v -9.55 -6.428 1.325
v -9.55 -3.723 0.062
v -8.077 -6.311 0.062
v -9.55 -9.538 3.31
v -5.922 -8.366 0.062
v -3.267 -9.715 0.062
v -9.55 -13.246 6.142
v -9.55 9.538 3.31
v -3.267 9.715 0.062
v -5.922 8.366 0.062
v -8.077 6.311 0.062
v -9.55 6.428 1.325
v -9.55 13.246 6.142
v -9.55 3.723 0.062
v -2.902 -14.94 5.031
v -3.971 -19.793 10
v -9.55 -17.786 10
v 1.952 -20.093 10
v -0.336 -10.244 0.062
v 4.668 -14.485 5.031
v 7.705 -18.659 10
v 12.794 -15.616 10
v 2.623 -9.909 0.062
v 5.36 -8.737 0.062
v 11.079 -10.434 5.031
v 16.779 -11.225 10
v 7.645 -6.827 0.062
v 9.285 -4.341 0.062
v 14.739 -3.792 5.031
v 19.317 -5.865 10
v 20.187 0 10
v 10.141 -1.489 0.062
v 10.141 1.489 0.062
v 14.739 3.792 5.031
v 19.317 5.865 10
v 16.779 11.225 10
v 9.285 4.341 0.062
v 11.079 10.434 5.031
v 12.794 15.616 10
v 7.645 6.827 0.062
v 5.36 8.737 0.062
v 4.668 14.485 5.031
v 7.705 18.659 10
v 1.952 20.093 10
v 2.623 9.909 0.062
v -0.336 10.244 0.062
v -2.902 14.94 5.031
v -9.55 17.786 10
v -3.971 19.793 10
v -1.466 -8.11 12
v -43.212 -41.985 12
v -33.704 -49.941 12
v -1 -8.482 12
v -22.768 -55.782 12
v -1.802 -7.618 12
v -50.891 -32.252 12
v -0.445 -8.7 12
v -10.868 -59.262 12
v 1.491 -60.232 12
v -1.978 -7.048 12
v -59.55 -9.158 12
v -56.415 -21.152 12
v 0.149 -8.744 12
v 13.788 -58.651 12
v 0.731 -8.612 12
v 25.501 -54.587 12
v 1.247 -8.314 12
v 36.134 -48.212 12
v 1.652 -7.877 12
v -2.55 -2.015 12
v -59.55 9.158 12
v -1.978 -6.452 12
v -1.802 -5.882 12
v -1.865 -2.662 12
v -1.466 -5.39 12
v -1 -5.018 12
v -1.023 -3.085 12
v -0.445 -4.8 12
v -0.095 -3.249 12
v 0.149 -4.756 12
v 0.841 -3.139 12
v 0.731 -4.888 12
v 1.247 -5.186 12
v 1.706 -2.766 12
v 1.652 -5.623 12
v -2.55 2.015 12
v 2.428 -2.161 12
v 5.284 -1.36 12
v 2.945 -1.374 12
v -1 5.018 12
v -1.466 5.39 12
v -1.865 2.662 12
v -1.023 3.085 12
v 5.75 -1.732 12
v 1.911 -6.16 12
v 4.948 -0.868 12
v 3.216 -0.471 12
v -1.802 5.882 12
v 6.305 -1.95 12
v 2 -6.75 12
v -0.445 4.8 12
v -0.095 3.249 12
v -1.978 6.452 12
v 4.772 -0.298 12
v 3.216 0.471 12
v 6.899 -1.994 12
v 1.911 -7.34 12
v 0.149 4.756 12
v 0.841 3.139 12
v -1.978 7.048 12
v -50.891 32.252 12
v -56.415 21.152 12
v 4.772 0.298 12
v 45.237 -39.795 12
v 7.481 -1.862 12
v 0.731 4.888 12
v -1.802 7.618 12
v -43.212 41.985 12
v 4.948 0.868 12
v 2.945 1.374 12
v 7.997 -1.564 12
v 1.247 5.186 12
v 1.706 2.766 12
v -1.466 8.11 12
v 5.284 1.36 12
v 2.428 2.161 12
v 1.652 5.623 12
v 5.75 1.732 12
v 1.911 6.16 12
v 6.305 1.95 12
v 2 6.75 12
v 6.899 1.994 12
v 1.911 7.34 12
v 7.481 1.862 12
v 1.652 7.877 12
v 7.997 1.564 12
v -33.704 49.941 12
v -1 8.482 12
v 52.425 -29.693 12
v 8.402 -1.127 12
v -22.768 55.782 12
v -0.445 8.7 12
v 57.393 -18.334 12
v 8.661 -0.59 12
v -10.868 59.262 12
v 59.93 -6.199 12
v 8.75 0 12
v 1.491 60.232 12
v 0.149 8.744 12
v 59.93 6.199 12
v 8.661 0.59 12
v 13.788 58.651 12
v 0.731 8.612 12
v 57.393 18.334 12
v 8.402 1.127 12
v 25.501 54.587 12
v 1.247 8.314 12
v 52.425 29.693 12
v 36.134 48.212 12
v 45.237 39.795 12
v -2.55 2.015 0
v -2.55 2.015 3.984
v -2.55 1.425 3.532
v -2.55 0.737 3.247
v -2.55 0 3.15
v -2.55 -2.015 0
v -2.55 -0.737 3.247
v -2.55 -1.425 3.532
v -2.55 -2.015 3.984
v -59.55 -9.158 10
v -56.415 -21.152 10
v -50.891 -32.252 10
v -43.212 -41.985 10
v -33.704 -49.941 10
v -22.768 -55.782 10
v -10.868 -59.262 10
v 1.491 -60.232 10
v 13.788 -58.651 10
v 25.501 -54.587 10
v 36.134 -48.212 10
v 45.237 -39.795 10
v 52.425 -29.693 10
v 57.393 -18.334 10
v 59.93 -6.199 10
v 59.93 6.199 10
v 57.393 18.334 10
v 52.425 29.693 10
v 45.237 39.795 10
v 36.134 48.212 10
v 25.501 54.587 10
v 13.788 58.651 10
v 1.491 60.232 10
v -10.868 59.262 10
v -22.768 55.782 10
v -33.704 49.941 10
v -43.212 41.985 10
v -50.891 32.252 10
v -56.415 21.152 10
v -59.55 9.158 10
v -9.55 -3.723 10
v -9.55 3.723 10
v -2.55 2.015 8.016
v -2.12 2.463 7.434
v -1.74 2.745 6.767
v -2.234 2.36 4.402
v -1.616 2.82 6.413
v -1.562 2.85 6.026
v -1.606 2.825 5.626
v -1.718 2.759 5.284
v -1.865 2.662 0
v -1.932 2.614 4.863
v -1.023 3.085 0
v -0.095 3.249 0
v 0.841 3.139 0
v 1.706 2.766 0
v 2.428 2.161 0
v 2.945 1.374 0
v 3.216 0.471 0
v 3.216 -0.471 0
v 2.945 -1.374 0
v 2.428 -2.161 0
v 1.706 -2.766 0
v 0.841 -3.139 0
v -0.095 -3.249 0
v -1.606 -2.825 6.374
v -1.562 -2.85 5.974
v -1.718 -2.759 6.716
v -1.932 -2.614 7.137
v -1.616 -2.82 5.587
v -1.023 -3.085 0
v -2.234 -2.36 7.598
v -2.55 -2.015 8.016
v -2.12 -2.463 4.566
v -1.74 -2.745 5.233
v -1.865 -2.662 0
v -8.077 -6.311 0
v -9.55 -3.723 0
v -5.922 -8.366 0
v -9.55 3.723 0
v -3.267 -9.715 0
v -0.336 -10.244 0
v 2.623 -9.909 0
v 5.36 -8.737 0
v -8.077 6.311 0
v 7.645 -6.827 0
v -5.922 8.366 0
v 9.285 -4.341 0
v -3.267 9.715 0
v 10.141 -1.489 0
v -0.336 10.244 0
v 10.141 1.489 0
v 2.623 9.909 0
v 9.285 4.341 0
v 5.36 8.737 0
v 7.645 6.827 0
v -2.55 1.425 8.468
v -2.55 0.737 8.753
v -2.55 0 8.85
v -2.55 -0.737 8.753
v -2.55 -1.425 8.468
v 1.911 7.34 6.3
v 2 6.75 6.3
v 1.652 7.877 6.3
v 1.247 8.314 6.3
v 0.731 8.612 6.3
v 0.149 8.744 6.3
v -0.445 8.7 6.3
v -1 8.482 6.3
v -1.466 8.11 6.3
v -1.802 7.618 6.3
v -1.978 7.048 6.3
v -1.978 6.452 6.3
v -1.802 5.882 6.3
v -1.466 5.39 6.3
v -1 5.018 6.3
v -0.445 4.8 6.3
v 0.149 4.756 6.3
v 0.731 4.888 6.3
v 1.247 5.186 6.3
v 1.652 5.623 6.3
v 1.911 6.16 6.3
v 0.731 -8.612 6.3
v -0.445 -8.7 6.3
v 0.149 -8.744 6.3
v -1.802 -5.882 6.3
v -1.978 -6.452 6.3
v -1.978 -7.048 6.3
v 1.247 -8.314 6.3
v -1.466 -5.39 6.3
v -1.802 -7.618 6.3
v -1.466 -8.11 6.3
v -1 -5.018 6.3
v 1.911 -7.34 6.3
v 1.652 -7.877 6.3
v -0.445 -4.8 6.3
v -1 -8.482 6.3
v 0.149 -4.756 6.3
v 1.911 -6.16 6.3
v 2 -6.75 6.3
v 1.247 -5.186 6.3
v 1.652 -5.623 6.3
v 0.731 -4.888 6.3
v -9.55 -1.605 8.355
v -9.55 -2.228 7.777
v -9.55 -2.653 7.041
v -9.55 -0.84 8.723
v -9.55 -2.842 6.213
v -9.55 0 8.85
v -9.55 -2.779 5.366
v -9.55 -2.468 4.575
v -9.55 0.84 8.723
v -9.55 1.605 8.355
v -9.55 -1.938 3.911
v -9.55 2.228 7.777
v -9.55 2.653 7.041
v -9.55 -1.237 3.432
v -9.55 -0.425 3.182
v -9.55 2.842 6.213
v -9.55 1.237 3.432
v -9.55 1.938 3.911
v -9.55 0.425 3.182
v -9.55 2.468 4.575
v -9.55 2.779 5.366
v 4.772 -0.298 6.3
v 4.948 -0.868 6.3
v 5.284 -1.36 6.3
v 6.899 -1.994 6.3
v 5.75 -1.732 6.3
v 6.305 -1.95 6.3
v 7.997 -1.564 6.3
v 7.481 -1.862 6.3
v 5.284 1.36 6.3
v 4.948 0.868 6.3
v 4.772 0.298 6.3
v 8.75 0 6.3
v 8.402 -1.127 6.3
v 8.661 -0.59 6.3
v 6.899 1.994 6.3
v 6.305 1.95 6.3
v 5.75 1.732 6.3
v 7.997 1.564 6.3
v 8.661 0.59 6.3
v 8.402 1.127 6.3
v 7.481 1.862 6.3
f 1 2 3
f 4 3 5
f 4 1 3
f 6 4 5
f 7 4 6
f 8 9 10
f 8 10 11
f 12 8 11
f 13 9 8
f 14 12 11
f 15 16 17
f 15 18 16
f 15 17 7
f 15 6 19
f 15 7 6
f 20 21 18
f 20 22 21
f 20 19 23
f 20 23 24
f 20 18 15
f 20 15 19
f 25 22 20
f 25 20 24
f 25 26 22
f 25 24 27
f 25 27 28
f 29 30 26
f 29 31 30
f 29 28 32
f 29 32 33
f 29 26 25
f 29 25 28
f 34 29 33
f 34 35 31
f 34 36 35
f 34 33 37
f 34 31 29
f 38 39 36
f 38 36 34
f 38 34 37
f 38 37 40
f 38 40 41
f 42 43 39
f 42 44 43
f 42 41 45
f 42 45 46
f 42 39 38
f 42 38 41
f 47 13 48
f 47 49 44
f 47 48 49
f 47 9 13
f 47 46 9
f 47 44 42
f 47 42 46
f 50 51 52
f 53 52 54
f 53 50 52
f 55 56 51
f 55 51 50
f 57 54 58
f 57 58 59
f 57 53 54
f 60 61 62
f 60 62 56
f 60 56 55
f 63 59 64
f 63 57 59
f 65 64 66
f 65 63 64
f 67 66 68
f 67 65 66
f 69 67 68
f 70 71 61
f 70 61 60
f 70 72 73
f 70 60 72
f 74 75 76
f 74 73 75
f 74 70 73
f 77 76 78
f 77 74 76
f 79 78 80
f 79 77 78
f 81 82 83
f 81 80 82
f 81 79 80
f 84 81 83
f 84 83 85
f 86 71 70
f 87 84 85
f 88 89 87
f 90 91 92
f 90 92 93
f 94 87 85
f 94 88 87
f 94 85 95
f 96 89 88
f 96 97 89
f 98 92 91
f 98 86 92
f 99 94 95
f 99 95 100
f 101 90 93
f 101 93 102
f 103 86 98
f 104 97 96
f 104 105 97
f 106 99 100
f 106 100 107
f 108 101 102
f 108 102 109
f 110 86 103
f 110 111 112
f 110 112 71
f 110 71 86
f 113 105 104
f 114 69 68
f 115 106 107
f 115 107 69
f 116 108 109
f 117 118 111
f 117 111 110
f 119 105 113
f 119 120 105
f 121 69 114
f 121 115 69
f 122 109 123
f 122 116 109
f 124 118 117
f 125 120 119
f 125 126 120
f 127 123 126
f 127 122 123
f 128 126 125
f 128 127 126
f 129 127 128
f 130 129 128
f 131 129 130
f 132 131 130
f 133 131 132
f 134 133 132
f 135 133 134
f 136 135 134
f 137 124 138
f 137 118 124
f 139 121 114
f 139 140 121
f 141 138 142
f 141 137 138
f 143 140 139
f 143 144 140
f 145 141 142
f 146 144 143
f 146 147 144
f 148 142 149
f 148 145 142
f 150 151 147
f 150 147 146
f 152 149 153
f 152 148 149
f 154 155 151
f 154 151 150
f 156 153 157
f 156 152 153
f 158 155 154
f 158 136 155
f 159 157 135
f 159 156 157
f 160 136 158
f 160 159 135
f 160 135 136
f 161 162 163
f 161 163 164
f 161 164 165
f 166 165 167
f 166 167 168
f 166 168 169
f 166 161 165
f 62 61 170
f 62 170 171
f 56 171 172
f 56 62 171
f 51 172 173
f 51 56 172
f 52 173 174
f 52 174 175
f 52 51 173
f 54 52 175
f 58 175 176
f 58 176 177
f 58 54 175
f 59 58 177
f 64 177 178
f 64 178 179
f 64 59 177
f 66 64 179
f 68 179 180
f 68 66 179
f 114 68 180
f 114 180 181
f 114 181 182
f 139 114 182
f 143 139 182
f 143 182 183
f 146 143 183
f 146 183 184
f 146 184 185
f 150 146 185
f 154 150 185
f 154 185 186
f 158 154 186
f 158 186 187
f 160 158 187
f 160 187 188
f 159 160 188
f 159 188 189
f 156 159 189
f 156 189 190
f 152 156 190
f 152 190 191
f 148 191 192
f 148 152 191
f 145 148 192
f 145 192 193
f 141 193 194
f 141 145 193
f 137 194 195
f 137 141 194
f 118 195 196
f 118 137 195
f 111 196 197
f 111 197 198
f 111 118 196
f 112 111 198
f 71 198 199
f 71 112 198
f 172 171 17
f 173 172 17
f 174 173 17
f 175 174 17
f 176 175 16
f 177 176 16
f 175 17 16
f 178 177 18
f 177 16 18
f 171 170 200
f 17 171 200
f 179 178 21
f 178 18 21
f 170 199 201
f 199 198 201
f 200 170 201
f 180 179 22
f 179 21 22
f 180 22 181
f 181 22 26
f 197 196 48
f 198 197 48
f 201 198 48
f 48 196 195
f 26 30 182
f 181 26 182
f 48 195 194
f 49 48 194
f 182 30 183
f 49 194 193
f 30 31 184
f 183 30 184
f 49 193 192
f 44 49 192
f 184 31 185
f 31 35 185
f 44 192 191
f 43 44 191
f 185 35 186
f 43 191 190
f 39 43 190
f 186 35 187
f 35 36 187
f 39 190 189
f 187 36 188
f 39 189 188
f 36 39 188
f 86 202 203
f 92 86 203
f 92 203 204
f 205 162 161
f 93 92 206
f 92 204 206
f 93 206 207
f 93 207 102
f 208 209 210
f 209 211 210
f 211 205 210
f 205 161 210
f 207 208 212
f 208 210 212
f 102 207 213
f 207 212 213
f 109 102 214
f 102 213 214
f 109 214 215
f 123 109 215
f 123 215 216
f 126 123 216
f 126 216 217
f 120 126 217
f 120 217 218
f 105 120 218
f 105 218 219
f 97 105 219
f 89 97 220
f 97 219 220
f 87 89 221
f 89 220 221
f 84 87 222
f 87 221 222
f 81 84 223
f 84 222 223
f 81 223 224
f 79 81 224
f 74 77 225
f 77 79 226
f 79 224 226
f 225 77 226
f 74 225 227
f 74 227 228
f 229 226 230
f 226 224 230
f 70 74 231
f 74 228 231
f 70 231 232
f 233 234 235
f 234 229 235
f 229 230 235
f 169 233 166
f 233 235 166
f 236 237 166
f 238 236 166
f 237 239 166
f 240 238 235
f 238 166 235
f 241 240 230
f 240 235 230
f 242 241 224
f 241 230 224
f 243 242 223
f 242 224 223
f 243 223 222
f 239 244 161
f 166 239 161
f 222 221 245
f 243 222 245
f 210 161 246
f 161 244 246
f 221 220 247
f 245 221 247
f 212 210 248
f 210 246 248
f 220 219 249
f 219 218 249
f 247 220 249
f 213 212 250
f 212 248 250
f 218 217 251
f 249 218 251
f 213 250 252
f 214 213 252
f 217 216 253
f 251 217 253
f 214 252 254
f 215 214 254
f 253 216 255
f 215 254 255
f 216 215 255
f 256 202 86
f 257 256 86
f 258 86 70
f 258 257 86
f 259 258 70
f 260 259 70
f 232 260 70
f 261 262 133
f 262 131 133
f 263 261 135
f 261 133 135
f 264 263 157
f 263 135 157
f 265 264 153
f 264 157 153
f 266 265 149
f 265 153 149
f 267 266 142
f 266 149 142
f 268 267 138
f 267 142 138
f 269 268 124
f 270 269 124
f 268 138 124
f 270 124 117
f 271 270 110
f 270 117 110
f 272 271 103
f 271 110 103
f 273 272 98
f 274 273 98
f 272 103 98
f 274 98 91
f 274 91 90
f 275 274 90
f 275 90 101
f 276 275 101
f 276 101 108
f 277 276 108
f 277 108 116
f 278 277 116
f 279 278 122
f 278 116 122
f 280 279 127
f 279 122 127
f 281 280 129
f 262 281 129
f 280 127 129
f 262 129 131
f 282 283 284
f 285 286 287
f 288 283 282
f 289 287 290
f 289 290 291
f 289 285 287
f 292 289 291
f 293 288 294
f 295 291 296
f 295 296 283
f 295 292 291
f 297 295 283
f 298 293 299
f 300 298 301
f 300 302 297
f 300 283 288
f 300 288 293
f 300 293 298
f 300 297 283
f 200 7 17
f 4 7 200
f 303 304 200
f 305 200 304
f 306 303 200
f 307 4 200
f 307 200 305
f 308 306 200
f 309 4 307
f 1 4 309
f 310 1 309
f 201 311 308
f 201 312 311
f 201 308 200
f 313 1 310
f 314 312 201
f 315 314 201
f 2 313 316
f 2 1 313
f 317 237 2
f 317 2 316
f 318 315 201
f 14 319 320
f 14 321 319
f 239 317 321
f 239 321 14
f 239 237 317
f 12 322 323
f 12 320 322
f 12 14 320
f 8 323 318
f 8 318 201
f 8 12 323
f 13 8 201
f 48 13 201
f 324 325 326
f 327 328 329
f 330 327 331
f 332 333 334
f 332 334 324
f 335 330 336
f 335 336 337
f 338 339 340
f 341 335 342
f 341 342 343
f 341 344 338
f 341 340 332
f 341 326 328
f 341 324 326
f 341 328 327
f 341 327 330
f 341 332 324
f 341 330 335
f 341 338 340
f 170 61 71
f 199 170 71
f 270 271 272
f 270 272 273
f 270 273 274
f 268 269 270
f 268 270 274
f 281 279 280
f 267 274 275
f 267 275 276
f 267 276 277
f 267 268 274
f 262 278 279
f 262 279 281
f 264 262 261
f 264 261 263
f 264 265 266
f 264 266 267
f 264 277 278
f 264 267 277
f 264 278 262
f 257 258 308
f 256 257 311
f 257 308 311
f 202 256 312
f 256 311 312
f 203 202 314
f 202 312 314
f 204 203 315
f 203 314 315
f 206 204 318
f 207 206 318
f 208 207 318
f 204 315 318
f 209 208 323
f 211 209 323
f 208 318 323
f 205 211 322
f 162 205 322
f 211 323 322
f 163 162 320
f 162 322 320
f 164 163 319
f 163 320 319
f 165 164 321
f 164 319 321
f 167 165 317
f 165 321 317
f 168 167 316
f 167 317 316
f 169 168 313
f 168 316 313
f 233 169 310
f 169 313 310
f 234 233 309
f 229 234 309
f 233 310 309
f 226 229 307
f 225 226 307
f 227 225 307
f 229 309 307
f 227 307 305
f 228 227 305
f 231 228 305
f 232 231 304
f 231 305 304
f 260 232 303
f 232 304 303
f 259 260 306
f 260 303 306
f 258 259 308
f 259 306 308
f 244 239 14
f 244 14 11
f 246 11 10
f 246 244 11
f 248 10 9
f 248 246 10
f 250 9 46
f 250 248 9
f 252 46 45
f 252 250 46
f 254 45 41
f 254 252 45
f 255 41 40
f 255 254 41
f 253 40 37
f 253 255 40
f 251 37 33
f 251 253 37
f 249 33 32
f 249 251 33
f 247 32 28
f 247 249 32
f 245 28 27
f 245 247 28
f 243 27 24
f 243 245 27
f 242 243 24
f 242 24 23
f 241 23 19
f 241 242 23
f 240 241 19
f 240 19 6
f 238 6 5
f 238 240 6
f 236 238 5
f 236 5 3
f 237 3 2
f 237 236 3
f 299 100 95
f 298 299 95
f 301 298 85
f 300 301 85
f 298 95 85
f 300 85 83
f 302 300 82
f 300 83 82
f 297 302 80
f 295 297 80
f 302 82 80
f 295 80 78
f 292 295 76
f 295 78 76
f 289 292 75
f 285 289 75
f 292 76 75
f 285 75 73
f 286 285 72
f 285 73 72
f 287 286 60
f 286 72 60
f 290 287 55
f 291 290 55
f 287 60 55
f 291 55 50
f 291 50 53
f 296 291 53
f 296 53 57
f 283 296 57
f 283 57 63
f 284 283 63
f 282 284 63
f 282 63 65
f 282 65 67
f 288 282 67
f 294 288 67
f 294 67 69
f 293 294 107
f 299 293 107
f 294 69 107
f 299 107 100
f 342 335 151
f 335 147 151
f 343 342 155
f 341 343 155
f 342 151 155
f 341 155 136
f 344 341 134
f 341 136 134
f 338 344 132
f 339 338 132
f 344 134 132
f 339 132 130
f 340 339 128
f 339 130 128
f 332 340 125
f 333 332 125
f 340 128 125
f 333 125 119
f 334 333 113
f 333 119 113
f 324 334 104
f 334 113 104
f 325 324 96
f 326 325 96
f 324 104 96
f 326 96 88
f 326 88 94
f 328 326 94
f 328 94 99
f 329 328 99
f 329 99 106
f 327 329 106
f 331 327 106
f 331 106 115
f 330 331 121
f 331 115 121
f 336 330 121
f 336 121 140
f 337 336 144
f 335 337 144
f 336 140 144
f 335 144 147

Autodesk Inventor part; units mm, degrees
ref_plane "YZ Plane" through (0, 0, 0) normal (1, 0, 0) x (0, 1, 0)
ref_plane "XZ Plane" through (0, 0, 0) normal (0, 1, 0) x (-1, 0, 0)
ref_plane "XY Plane" through (0, 0, 0) normal (0, 0, 1) x (1, 0, 0)
sketch "Sketch1" plane through (0, 0, 0) normal (0, 0, 1) x (1, 0, 0)
  arc A0 (-2.55, -2.0149) -> (-2.55, 2.0149) centre (0, 0) ccw projected
  line L0 (-2.55, 2.0149) -> (-2.55, -2.0149) projected
  arc A1 (-9.55, -3.7229) -> (-9.55, 3.7229) centre (0, 0) ccw
  line L1 (-9.55, -3.7229) -> (-9.55, 3.7229)
  point P0 (0, 0)
  dimension "d4" = 7
extrude "Extrusion1" add sketch "Sketch1" along normal blind 12
sketch "Sketch2" plane through (-9.55, -3.7229, 0) normal (-1, 0, 0) x (0, 0, 1)
  line L0 (0, 7.4458) -> (0, 0) projected
  line L1 (0, 0) -> (12, 0) projected
  line L2 (12, 7.4458) -> (12, 0) projected
  line L3 (0, 7.4458) -> (12, 7.4458) projected
  circle A0 centre (6, 3.7229) radius 3.25
  circle A1 centre (6, 3.7229) radius 2.85
  point P0 (0, 3.7229)
  dimension "d15" = 5.7
extrude "Extrusion2" cut sketch "Sketch2" against normal blind 10.4125 contours A1
sketch "Sketch3" plane through (0, 0, 12) normal (0, 0, 1) x (1, 0, 0)
  arc A0 (-2.55, -2.0149) -> (-2.55, 2.0149) centre (0, 0) ccw projected
  line L0 (-2.55, 2.0149) -> (-2.55, -2.0149) projected
  line L1 (-9.55, 3.7229) -> (-9.55, -3.7229) projected
  arc A1 (-9.55, -3.7229) -> (-9.55, 3.7229) centre (0, 0) ccw projected
  line L2 (-2.55, -2.0149) -> (-2.55, 2.0149) projected
  arc A2 (-2.55, -2.0149) -> (-2.55, 2.0149) centre (0, 0) ccw projected
  line L3 (0, 10.25) -> (0, 3.25)
  circle A3 centre (0, 6.75) radius 2
  circle A4 centre (6.75, 0) radius 2
  circle A5 centre (0, -6.75) radius 2
  point P0 (0, 0)
  dimension "d7" = 4
  dimension "d10" = 180
extrude "Extrusion3" cut sketch "Sketch3" against normal blind 5.7 contours A3 L3 | L3 A3 | A4 | A5
sketch "Sketch4" plane through (0, 0, 12) normal (0, 0, 1) x (1, 0, 0)
  circle A0 centre (0, -6.75) radius 2 projected
  circle A1 centre (6.75, 0) radius 2 projected
  circle A2 centre (0, 6.75) radius 2 projected
  line L0 (-9.55, 3.7229) -> (-9.55, -3.7229) projected
  arc A3 (-9.55, -3.7229) -> (-9.55, 3.7229) centre (0, 0) ccw projected
  line L1 (-2.55, -2.0149) -> (-2.55, 2.0149) projected
  arc A4 (-2.55, -2.0149) -> (-2.55, 2.0149) centre (0, 0) ccw projected
  line L2 (-59.55, -9.1575) -> (-59.55, 9.1575)
  arc A5 (-59.55, -9.1575) -> (-59.55, 9.1575) centre (0, 0) ccw
  point P0 (0, 0)
  dimension "d16" = 50
extrude "Extrusion4" add sketch "Sketch4" against normal blind 2 contours L2 A5
chamfer "Chamfer1" distance 9.9375 angle 45 1 edges at (10.25, 0, 10)
properties part number "Pladeholder"
